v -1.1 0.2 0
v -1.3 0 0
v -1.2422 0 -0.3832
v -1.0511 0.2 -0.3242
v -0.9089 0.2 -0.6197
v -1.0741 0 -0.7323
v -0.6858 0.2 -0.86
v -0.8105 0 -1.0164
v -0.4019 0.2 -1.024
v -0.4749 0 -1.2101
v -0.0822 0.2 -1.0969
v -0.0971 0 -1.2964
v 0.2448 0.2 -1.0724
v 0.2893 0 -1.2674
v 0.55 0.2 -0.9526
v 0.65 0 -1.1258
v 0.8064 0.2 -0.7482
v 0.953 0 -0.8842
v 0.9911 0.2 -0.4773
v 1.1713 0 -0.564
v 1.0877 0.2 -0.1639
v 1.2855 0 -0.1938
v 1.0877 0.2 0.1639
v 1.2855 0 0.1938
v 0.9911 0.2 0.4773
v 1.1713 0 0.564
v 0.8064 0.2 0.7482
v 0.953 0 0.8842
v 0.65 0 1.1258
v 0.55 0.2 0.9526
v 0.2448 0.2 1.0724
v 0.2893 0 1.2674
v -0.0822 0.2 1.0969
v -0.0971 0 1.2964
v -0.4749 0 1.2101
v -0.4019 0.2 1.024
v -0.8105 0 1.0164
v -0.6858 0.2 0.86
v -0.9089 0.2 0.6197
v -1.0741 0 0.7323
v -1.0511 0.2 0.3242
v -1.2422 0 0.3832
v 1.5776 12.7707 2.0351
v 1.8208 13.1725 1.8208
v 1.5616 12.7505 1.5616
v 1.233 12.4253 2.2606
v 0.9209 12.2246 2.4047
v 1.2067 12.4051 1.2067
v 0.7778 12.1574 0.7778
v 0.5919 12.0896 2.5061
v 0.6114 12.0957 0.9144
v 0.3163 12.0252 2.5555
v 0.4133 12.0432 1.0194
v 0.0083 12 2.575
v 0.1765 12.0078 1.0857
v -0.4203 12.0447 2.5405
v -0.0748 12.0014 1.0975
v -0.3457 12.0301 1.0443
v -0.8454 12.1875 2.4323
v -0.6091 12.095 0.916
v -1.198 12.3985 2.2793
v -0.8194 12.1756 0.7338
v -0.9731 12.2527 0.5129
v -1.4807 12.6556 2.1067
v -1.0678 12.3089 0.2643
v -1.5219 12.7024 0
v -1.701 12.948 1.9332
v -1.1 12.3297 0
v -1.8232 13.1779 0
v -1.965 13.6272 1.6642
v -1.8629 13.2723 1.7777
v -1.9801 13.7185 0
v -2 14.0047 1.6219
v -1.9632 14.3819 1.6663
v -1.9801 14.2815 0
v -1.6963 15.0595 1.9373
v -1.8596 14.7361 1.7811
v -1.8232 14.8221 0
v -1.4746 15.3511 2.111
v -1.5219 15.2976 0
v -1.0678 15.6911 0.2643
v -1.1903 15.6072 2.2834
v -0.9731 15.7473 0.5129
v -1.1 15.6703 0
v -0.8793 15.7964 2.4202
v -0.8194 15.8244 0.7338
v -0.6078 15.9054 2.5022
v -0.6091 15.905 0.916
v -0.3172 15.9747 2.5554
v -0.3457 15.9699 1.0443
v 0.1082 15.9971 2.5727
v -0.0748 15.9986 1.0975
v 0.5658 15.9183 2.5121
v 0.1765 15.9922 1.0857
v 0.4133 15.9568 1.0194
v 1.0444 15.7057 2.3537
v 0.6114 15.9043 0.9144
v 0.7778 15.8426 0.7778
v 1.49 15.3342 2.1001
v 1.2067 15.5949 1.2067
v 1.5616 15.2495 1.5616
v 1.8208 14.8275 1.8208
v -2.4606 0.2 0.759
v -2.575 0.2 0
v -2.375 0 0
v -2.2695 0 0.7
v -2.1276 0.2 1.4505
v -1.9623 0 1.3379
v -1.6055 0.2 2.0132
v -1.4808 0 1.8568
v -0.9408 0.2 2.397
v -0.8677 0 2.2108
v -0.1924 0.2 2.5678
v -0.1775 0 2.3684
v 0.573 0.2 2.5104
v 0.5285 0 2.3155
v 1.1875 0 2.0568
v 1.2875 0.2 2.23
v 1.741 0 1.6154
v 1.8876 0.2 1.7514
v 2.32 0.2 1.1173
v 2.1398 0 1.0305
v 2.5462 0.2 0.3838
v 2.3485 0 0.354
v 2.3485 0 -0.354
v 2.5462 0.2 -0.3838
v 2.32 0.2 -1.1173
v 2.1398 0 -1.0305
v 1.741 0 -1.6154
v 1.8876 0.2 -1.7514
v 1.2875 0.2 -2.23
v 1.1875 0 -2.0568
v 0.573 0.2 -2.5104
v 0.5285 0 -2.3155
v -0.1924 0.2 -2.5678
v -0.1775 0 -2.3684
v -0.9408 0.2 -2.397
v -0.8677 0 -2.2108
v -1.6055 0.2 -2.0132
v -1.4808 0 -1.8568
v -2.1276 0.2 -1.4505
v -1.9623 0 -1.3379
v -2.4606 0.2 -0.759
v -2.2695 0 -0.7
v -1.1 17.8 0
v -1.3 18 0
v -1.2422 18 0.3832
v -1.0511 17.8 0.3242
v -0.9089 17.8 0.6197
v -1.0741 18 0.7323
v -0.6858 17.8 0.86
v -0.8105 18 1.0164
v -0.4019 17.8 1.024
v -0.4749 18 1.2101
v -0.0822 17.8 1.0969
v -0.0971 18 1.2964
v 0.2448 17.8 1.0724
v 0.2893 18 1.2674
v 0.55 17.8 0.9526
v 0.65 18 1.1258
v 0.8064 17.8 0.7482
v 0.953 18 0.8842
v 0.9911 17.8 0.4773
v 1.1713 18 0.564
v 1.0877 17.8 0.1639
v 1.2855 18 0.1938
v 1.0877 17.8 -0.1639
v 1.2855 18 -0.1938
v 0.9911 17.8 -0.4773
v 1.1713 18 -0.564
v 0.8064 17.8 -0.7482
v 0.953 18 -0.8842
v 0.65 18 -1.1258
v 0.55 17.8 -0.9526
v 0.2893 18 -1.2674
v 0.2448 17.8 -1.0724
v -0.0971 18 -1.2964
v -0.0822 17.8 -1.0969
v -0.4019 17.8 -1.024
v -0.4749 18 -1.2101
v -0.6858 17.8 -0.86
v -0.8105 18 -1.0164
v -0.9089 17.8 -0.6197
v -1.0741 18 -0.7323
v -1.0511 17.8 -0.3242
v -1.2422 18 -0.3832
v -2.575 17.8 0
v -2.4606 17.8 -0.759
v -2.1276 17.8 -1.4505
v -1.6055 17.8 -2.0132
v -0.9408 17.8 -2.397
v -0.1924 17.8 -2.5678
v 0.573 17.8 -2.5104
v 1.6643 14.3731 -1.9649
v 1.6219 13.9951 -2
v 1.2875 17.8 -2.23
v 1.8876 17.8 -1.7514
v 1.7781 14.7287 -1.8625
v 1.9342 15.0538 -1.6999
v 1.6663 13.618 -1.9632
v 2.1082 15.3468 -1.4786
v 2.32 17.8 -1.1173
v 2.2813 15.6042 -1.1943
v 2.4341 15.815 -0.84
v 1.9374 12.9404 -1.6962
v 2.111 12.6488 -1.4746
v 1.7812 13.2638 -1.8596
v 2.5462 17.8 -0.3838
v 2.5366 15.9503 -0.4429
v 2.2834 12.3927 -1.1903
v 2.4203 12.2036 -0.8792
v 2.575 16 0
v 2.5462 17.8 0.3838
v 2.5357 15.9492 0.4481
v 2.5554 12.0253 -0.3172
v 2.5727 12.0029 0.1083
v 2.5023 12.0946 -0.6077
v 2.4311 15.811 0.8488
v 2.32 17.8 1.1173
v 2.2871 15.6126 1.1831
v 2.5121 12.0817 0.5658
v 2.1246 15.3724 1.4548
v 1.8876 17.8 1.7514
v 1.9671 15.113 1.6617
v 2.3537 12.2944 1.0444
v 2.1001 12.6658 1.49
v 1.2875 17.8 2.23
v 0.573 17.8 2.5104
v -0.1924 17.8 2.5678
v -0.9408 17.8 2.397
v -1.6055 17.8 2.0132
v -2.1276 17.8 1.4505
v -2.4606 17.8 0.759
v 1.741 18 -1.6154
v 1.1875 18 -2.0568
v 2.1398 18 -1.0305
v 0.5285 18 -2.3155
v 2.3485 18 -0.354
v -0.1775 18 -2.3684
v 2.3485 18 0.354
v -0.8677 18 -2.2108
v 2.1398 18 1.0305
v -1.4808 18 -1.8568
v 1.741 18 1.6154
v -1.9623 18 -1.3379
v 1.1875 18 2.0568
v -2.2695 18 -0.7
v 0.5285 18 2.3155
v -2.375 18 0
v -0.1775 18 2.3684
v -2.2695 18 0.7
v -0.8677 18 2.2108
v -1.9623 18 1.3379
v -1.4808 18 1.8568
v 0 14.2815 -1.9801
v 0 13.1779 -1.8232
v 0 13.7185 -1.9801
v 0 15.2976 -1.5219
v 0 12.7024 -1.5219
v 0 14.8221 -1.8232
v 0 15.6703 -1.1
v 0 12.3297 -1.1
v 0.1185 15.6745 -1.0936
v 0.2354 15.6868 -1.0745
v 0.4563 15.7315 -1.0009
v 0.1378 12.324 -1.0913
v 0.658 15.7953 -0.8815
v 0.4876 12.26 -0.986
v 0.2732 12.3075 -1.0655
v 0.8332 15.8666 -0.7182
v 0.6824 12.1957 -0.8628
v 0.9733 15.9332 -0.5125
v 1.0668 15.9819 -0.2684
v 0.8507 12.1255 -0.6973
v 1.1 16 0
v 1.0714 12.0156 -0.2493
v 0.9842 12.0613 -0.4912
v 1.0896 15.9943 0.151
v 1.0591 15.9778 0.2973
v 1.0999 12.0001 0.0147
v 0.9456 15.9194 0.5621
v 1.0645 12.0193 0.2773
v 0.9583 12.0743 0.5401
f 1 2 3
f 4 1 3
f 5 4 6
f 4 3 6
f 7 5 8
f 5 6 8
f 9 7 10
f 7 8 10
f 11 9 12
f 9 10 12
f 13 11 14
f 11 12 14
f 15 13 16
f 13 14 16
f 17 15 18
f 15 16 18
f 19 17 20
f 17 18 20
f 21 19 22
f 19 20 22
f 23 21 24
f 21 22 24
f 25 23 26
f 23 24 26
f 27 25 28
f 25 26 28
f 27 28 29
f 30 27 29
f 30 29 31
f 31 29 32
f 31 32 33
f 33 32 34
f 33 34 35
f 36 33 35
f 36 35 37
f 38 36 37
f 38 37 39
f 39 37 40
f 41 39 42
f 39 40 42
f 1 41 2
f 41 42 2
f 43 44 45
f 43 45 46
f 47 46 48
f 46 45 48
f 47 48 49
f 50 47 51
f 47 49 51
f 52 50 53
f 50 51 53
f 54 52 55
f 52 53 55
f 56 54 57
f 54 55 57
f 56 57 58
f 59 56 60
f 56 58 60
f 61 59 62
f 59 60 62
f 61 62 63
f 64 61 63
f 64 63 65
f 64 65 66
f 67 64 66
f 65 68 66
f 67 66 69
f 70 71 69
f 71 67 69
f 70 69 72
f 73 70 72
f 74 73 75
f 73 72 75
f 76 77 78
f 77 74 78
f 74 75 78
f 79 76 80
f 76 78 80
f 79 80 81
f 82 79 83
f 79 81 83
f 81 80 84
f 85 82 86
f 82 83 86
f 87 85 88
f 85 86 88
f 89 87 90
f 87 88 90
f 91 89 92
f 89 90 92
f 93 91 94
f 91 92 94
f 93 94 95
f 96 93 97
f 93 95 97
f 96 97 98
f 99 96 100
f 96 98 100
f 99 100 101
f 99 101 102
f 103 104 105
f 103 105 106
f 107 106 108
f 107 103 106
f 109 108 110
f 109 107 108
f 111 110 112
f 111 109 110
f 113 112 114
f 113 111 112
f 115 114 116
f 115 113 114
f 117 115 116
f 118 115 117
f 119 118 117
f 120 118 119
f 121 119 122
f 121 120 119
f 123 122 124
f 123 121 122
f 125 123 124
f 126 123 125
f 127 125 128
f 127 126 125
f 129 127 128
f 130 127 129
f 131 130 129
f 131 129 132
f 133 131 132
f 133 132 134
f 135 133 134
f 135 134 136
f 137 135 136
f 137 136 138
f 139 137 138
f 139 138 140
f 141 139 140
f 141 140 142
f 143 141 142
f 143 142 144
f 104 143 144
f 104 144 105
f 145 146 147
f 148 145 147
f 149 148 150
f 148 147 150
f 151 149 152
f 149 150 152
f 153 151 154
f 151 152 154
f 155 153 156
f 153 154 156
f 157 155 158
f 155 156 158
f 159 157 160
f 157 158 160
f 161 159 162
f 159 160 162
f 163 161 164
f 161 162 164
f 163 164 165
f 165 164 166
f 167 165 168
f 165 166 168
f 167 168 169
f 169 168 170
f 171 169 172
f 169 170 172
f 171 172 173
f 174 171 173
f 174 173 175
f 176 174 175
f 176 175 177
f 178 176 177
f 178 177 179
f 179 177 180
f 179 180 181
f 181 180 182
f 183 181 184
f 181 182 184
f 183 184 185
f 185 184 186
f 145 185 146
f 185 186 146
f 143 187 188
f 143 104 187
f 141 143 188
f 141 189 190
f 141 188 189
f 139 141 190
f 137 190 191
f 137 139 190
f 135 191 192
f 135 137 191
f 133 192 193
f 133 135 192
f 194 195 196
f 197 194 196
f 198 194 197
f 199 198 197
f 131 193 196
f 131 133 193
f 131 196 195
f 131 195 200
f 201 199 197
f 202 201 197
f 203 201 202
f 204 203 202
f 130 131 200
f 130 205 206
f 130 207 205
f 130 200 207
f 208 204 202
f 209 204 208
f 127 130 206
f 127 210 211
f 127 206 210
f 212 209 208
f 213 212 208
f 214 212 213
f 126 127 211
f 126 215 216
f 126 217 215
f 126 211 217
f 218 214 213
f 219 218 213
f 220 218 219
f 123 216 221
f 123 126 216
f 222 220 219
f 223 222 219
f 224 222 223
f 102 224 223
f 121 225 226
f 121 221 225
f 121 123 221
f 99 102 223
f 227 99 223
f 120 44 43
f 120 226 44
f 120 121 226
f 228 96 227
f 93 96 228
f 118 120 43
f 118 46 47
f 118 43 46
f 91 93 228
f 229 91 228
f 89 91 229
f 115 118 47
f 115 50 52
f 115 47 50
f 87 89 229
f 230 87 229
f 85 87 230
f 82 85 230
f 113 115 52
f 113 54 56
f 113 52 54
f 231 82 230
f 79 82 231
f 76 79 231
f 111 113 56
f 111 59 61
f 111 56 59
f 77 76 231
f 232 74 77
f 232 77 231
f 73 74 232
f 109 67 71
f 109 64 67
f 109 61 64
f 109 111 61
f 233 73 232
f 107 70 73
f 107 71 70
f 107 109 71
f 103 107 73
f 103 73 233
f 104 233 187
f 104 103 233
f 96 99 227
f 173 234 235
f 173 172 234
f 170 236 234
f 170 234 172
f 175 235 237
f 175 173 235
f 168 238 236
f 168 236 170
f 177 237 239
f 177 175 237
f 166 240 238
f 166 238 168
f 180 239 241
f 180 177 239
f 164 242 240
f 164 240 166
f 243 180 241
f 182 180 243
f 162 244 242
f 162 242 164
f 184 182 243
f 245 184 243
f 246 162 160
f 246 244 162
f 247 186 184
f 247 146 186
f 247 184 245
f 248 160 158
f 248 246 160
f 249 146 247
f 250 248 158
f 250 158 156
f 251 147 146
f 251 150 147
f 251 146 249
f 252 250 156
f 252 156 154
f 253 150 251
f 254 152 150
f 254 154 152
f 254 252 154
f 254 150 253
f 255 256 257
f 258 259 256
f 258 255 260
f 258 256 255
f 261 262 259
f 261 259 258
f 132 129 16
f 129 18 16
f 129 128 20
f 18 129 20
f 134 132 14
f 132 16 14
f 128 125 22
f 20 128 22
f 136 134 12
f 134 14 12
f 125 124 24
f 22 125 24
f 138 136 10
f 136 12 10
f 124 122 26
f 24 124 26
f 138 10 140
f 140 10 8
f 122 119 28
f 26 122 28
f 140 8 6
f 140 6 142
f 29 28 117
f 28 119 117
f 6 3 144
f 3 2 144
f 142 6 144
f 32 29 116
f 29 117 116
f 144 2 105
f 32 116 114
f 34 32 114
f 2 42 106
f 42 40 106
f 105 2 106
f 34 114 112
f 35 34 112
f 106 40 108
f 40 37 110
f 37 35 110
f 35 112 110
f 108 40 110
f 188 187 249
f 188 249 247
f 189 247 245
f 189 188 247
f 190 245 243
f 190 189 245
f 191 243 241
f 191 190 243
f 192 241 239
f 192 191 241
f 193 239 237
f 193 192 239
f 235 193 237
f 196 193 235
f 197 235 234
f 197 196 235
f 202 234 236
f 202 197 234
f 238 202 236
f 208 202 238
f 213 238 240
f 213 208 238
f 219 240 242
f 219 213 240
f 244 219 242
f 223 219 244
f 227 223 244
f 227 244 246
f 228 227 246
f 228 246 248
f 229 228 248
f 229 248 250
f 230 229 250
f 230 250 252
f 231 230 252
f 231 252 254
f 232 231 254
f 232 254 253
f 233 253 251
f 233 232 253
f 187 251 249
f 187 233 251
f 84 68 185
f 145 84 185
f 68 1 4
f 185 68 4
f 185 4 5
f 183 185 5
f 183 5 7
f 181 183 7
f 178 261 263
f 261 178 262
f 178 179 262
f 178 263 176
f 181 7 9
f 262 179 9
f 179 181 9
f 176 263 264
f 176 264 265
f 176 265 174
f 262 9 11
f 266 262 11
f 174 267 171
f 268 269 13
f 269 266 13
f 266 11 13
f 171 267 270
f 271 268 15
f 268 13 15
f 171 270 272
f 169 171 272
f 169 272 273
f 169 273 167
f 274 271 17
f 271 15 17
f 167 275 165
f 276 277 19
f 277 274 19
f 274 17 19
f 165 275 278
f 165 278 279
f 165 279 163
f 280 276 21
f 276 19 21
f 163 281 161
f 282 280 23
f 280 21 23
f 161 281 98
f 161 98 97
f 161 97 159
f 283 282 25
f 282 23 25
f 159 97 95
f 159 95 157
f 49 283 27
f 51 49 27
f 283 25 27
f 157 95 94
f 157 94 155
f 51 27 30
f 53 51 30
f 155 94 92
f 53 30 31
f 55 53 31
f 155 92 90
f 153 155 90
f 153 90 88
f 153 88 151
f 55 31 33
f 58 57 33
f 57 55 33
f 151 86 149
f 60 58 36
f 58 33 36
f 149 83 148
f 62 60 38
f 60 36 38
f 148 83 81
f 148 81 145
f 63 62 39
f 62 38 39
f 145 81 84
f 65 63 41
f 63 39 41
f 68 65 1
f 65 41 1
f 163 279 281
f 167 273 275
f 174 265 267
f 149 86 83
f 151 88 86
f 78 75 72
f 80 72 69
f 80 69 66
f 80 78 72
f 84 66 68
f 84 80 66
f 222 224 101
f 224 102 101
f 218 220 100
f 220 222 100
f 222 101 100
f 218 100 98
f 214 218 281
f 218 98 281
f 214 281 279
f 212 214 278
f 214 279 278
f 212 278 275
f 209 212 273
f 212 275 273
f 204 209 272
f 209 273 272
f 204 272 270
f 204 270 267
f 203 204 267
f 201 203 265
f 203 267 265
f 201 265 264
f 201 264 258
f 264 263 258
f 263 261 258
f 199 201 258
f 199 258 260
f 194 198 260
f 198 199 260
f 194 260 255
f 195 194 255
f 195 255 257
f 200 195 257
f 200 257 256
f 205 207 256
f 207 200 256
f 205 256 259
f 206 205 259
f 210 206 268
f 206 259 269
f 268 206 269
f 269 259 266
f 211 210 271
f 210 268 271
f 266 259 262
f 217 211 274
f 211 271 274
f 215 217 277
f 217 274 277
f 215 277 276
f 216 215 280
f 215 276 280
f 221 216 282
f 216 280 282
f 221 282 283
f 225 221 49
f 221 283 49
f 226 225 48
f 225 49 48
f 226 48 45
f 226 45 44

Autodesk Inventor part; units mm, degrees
ref_plane "XZ Plane" through (0, 0, 0) normal (0, 1, 0) x (-1, 0, 0)
ref_plane "XY Plane" through (0, 0, 0) normal (0, 0, 1) x (1, 0, 0)
sketch "Sketch1" plane through (0, 0, 0) normal (0, 1, 0) x (-1, 0, 0)
  circle A0 centre (0, 0) radius 1.1
  circle A1 centre (0, 0) radius 2.575
  dimension "d0" = 2.2
  dimension "d1" = 5.15
extrude "Extrusion1" add sketch "Sketch1" along normal blind 18
sketch "Sketch2" plane through (0, 0, 0) normal (0, 0, 1) x (1, 0, 0)
  line L0 (2.575, 18) -> (-2.575, 18) projected
  line L1 (2.575, 0) -> (-2.575, 0) projected
  line L2 (-2.575, 0) -> (-2.575, 18) projected
  line L3 (-2.575, 16) -> (2.5173, 16)
  line L4 (2.575, 18) -> (-2.575, 18) projected
  line L5 (0, 18) -> (0, 0)
  circle A0 centre (0, 14) radius 2
  dimension "d4" = 2
  dimension "d5" = 4
extrude "Extrusion2" cut sketch "Sketch2" along normal blind 12 contours A0 L5 | L5 A0
sketch "Sketch3" plane through (0, 0, 0) normal (1, 0, 0) x (0, 1, 0)
  line L0 (18, -2.575) -> (18, 2.575) projected
  line L1 (0, -2.575) -> (0, 2.575) projected
  line L2 (0, 2.575) -> (18, 2.575) projected
  line L3 (16, 2.575) -> (16, -2.525)
  line L4 (18, 1.1) -> (18, -1.1) projected
  line L5 (18, 0) -> (0, 0)
  circle A0 centre (14, 0) radius 2
  point P0 (14, 1.6219)
  dimension "d8" = 2
  dimension "d9" = 4
extrude "Extrusion3" cut sketch "Sketch3" along normal up to next contours A0 L5 | L5 A0
chamfer "Chamfer1" distance 0.2 angle 45 4 edges at (1.1, 0, 0) (2.575, 0, 0) (1.1, 18, 0) (2.575, 18, 0)
properties part number "motor_shaft_adapter"
